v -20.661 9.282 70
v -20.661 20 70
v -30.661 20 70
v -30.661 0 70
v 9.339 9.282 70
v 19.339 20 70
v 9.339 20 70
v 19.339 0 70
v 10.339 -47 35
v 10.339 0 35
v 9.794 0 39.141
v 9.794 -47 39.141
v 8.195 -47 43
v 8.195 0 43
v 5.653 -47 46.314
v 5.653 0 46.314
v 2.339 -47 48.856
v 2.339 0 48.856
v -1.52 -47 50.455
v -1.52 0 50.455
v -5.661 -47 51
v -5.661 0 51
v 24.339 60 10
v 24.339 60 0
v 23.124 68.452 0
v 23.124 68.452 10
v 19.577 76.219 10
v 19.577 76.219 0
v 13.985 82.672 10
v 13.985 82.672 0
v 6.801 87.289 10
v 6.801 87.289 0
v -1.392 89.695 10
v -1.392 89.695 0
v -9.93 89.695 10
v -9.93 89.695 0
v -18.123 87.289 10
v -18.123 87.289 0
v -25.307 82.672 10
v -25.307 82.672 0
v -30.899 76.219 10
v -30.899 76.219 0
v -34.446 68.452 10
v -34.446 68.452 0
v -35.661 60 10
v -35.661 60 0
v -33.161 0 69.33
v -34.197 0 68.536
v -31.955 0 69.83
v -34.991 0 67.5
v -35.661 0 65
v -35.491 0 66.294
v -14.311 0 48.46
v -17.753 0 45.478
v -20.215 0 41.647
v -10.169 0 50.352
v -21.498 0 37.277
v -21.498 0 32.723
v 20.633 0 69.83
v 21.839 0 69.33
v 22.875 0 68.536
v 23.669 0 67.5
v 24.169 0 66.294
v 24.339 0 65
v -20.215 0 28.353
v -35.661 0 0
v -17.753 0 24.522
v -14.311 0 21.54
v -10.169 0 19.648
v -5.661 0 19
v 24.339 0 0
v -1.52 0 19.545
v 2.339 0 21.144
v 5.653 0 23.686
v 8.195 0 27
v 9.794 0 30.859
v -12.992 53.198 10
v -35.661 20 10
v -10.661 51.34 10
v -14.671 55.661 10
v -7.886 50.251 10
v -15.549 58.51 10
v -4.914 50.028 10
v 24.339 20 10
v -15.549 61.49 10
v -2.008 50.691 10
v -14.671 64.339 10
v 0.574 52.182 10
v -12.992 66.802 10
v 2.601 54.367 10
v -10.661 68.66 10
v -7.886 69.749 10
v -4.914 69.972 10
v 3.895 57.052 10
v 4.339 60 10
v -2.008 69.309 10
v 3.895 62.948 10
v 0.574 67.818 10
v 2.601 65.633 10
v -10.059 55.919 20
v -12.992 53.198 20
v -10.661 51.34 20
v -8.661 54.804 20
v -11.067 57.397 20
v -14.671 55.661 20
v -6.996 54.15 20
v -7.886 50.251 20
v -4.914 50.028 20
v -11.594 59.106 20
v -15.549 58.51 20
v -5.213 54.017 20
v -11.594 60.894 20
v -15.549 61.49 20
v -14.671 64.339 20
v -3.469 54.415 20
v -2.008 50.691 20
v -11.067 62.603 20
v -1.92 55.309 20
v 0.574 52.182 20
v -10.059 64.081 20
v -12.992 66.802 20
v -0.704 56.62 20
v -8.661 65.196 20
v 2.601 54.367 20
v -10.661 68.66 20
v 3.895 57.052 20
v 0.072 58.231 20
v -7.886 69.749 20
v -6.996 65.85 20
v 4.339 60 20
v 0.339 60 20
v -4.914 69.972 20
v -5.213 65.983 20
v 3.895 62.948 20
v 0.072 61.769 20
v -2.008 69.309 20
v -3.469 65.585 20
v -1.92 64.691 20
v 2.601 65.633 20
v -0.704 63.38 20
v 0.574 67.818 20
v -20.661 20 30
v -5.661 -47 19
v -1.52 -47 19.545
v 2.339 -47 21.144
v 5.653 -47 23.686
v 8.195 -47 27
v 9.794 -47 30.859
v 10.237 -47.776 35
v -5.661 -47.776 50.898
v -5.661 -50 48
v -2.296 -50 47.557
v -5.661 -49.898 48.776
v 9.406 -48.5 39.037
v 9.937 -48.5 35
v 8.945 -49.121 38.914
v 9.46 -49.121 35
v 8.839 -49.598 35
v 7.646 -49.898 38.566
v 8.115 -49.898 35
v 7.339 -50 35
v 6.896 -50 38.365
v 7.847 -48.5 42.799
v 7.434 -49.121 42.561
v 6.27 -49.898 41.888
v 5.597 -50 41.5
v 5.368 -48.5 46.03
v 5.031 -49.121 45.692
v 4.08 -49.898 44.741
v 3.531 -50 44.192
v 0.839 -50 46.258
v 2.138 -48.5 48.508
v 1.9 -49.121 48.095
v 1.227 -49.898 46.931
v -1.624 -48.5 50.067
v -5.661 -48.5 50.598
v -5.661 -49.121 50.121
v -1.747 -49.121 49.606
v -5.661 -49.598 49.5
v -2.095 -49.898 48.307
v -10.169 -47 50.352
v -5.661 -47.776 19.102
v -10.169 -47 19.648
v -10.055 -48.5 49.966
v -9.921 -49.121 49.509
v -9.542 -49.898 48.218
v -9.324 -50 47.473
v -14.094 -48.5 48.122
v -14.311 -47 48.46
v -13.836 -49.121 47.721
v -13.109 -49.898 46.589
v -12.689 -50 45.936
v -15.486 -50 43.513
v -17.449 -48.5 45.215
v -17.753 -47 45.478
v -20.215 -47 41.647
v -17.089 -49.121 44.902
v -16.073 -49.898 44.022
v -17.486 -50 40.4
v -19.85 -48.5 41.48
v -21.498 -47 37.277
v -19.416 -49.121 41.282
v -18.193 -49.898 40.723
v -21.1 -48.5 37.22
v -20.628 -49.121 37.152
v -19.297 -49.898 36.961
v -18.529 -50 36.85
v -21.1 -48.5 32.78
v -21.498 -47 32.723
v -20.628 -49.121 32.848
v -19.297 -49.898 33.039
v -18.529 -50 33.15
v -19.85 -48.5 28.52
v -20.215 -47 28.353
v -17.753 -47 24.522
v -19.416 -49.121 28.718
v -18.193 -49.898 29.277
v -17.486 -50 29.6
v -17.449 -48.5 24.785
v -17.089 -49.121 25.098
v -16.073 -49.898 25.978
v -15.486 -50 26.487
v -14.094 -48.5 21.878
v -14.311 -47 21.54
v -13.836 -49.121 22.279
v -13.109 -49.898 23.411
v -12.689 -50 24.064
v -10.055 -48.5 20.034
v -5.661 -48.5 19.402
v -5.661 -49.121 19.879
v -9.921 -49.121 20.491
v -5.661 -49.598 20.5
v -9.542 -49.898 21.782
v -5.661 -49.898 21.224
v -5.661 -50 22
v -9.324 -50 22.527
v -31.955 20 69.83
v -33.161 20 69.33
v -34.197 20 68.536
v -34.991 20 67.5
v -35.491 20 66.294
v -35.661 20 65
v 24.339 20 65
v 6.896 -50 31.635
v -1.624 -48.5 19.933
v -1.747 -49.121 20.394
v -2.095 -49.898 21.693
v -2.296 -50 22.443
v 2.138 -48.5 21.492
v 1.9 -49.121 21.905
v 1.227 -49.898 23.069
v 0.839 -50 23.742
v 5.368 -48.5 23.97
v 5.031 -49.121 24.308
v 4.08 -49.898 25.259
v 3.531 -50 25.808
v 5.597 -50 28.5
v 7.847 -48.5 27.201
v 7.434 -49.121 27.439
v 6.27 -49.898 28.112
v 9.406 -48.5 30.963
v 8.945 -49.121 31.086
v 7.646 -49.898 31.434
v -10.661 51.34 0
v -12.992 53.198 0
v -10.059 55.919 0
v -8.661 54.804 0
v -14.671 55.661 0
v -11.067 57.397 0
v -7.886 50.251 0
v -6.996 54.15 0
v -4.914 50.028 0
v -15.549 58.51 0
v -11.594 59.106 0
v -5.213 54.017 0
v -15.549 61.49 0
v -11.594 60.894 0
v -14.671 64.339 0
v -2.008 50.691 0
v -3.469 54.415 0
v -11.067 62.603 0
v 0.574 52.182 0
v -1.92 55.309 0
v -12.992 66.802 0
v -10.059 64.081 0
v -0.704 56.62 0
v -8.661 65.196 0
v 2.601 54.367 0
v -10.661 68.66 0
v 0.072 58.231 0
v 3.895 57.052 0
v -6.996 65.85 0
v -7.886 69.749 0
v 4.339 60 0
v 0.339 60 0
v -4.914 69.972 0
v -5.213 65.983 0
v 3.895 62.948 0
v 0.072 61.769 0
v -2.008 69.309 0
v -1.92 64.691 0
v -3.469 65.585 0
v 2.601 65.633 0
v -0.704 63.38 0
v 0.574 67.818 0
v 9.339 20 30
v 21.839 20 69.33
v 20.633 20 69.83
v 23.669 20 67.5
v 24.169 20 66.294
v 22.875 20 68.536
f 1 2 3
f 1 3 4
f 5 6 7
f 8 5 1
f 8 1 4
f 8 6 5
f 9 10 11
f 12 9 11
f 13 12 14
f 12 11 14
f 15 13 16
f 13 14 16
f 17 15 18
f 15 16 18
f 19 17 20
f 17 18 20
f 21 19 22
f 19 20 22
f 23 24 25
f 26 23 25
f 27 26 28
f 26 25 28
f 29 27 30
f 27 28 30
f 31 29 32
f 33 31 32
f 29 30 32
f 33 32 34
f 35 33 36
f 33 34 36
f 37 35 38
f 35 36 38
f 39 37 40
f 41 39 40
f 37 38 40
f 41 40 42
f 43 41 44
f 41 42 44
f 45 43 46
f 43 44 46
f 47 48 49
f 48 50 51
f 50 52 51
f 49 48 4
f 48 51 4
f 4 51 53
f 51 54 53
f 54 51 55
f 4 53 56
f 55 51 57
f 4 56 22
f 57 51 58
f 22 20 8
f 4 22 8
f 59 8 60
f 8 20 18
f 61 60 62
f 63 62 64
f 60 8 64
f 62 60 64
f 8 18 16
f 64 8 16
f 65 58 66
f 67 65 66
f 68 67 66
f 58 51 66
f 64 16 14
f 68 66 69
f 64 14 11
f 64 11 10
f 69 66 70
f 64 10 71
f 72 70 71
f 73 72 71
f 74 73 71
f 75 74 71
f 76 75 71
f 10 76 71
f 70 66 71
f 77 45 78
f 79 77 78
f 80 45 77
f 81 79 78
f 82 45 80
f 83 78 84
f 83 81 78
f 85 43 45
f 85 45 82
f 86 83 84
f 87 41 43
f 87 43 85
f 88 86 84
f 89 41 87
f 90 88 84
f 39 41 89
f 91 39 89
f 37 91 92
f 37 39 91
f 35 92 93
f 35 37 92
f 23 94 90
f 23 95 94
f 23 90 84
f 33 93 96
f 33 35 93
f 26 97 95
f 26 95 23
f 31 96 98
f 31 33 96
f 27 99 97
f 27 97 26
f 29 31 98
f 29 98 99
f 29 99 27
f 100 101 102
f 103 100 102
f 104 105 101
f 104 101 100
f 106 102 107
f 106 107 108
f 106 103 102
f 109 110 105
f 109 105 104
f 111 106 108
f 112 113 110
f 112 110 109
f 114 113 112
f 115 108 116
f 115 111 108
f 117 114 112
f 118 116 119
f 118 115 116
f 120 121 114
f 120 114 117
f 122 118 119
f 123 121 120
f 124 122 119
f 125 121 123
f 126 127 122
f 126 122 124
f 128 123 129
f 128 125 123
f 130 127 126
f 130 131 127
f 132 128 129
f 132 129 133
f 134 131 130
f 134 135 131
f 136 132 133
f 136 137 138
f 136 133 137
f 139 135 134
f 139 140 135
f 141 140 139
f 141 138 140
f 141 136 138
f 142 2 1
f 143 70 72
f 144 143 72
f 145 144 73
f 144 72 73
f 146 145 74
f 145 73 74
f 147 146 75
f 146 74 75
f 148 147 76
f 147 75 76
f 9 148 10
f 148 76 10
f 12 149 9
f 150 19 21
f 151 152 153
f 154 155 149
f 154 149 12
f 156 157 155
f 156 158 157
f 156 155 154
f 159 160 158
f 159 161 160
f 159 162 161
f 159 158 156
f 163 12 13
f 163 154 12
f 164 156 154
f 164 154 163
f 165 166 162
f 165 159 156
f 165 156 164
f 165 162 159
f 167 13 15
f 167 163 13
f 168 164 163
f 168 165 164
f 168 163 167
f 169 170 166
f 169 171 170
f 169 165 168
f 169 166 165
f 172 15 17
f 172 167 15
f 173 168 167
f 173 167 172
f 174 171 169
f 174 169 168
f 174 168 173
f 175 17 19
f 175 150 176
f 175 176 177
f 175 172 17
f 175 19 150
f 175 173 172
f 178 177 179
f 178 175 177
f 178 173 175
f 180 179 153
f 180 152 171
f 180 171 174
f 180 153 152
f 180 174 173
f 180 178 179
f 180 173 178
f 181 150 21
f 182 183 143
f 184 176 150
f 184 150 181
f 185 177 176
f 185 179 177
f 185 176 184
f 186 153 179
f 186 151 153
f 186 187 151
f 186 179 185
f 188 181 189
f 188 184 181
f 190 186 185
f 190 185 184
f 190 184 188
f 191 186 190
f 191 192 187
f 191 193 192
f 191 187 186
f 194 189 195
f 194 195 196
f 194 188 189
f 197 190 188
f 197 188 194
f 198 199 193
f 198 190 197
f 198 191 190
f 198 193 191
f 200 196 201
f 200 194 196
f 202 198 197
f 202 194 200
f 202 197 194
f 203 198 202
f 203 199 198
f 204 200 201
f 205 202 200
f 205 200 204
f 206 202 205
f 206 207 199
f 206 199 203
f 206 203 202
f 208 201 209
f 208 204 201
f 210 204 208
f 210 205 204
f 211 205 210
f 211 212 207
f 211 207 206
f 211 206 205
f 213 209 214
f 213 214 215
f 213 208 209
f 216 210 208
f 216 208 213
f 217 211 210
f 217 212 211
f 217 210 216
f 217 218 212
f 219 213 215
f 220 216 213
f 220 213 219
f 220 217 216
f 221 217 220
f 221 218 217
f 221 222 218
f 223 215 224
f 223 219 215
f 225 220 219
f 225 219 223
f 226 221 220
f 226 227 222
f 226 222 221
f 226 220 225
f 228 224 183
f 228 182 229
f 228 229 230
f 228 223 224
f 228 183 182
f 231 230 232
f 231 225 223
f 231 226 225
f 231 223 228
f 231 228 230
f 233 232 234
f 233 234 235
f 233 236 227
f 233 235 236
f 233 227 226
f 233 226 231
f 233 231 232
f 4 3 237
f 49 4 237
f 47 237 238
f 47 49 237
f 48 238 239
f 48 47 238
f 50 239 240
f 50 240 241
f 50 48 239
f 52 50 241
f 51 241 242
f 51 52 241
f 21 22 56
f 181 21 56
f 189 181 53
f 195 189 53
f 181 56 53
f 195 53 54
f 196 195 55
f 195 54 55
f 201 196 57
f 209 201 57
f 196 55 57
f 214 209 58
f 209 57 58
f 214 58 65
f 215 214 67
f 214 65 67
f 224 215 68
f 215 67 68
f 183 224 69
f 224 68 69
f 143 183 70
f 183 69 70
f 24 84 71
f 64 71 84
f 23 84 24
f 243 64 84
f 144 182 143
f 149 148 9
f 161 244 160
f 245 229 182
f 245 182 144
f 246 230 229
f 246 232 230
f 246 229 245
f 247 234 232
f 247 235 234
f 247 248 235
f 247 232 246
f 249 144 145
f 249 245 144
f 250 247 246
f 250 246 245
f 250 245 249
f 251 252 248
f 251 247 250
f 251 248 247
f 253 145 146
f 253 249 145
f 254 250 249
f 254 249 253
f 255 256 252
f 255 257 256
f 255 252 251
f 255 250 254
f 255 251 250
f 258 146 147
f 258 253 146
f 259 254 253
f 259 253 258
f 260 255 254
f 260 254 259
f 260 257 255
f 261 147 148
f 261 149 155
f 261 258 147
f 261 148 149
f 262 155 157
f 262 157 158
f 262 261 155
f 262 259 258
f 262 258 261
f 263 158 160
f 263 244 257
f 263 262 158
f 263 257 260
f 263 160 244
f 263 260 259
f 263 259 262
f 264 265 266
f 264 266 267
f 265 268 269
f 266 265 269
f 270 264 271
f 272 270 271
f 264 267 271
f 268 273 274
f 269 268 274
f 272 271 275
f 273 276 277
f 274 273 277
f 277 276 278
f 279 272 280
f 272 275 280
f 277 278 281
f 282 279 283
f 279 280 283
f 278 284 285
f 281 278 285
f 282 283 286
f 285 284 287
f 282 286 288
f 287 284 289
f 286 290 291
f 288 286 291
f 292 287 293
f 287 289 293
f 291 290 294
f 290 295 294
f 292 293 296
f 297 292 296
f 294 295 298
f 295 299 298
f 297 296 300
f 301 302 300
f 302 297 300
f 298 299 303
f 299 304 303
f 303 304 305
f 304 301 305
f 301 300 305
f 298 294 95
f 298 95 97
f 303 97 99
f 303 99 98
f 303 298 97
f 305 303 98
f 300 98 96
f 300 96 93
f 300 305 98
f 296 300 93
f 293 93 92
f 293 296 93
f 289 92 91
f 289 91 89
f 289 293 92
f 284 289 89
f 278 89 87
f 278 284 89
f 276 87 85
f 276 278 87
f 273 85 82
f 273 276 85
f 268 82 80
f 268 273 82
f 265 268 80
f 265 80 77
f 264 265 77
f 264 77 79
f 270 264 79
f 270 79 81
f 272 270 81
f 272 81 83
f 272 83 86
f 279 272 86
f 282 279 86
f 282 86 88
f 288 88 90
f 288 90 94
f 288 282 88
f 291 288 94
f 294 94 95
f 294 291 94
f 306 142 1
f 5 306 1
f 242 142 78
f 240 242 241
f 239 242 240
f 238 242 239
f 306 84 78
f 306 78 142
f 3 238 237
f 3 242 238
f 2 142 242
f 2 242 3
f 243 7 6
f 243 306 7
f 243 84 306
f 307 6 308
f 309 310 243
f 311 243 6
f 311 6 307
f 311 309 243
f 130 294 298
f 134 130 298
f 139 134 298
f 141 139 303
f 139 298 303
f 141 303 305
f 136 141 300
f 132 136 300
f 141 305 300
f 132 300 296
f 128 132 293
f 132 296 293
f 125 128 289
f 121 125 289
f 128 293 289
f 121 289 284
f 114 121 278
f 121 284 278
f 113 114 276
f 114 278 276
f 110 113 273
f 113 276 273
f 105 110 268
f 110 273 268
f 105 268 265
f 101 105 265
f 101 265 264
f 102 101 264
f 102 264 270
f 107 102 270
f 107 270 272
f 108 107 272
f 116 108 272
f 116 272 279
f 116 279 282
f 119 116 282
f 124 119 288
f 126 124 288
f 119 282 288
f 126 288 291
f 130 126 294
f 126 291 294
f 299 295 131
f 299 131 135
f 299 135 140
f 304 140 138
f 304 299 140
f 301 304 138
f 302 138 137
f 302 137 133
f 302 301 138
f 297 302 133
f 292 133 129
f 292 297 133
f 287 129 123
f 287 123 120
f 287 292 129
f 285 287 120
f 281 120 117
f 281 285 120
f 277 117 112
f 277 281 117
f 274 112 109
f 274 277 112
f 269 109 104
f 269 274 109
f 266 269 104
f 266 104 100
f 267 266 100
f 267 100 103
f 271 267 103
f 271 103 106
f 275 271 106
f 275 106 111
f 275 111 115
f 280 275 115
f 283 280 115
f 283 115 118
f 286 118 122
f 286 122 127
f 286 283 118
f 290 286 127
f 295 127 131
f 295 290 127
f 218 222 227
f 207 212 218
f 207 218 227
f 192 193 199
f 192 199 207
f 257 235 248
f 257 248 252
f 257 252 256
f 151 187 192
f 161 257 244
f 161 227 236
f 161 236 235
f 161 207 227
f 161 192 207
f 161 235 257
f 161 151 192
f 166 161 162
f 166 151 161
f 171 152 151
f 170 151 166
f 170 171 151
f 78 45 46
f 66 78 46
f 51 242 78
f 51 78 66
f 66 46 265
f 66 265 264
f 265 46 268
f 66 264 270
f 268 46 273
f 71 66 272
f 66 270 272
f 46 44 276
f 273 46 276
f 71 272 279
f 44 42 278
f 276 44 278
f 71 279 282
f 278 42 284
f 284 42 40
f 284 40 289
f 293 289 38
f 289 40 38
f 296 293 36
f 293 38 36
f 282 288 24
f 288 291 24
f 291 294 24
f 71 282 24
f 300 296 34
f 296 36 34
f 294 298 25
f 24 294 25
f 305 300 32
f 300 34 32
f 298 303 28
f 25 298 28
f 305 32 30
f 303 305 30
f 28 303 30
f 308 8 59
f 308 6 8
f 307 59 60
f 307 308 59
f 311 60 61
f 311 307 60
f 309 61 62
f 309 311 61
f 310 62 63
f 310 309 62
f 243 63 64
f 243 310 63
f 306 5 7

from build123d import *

# Parameters (mm, degrees)
F0_R      = 10
F1_DEPTH  = 10
F0_R_2    = 6
F2_DEPTH  = 20
F3_DEPTH  = 70
F5_DEPTH  = 60
F6_DEPTH  = 15
F8_R      = 5
F9_DEPTH  = 15
F10_R     = 5
F12_DEPTH = 50
F13_R     = 3


# Not quite as in the source:
# - a feature names something its author has since deleted; it is built from what else it names


with BuildPart() as f1:
    # F0 (on Top) → F1 (new body)
    with BuildSketch(Plane.XY):
        with BuildLine():
            Line((-35.661008209, 60), (-35.661008209, 20))
            Line((-35.661008209, 20), (24.338991791, 20))
            Line((24.338991791, 20), (24.338991791, 60))
            ThreePointArc((24.338991791, 60), (15.5521952266, 81.2132034356), (-5.661008209, 90))
            ThreePointArc((-5.661008209, 90), (-26.8742116446, 81.2132034356), (-35.661008209, 60))
        make_face()
        with Locations((-5.661008209, 60)):
            Circle(F0_R, mode=Mode.SUBTRACT)
    extrude(amount=F1_DEPTH)

    # F0 (on Top) → F3 (join)
    with BuildSketch(Plane.XY):
        Polygon((-35.661008209, 0), (-21.661008209, 0), (10.338991791, 0), (24.338991791, 0), (24.338991791, 20), (-35.661008209, 20), align=None)
    extrude(amount=F3_DEPTH)

    # F4 (on face) → F5 (cut)
    with BuildSketch(Plane(origin=(-35.661008209, 0, 0), x_dir=(0, -1, 0), z_dir=(-1, 0, 0))):
        Polygon((-9.2820323028, 70), (-20, 70), (-20, 30), align=None)
    extrude(amount=-F5_DEPTH, mode=Mode.SUBTRACT)

    # F4 (on face) → F6 (join)
    with BuildSketch(Plane(origin=(-35.661008209, 0, 0), x_dir=(0, -1, 0), z_dir=(-1, 0, 0))):
        Polygon((-9.2820323028, 70), (-20, 70), (-20, 30), align=None)
    extrude(amount=-F6_DEPTH)

    # F8
    f8_edges = [f1.edges().sort_by_distance(p)[0] for p in [
        (-35.661008, 10, 70),
    ]]
    fillet(f8_edges, radius=F8_R)

    # F7 (on face) → F9 (join)
    with BuildSketch(Plane.YZ.offset(24.338991791)):
        Polygon((20, 70), (9.2820323028, 70), (20, 30), align=None)
    extrude(amount=-F9_DEPTH)

    # F10
    f10_edges = [f1.edges().sort_by_distance(p)[0] for p in [
        (24.338992, 10, 70),
    ]]
    fillet(f10_edges, radius=F10_R)

    # F11 (on face) → F12 (join)
    with BuildSketch(Plane.XZ):
        with BuildLine():
            Line((-5.661008209, 35), (-5.661008209, 19))
            ThreePointArc((-5.661008209, 19), (5.65270029, 23.686291501), (10.338991791, 35))
            ThreePointArc((10.338991791, 35), (5.65270029, 46.313708499), (-5.661008209, 51))
            Line((-5.661008209, 51), (-5.661008209, 35))
        make_face()
        with BuildLine():
            ThreePointArc((-5.661008209, 51), (-21.661008209, 35), (-5.661008209, 19))
            Line((-5.661008209, 19), (-5.661008209, 35))
            Line((-5.661008209, 35), (-5.661008209, 51))
        make_face()
    extrude(amount=F12_DEPTH)

    # F13
    f13_edges = [f1.edges().sort_by_distance(p)[0] for p in [
        (-5.661008, -50, 19),
    ]]
    fillet(f13_edges, radius=F13_R)


with BuildPart() as f2:
    # F0 (on Top) → F2 (new body)
    with BuildSketch(Plane.XY):
        with Locations((-5.661008209, 60)):
            Circle(F0_R)
        with Locations((-5.661008209, 60)):
            Circle(F0_R_2, mode=Mode.SUBTRACT)
    extrude(amount=F2_DEPTH)


solid = Compound([f1.part, f2.part])
